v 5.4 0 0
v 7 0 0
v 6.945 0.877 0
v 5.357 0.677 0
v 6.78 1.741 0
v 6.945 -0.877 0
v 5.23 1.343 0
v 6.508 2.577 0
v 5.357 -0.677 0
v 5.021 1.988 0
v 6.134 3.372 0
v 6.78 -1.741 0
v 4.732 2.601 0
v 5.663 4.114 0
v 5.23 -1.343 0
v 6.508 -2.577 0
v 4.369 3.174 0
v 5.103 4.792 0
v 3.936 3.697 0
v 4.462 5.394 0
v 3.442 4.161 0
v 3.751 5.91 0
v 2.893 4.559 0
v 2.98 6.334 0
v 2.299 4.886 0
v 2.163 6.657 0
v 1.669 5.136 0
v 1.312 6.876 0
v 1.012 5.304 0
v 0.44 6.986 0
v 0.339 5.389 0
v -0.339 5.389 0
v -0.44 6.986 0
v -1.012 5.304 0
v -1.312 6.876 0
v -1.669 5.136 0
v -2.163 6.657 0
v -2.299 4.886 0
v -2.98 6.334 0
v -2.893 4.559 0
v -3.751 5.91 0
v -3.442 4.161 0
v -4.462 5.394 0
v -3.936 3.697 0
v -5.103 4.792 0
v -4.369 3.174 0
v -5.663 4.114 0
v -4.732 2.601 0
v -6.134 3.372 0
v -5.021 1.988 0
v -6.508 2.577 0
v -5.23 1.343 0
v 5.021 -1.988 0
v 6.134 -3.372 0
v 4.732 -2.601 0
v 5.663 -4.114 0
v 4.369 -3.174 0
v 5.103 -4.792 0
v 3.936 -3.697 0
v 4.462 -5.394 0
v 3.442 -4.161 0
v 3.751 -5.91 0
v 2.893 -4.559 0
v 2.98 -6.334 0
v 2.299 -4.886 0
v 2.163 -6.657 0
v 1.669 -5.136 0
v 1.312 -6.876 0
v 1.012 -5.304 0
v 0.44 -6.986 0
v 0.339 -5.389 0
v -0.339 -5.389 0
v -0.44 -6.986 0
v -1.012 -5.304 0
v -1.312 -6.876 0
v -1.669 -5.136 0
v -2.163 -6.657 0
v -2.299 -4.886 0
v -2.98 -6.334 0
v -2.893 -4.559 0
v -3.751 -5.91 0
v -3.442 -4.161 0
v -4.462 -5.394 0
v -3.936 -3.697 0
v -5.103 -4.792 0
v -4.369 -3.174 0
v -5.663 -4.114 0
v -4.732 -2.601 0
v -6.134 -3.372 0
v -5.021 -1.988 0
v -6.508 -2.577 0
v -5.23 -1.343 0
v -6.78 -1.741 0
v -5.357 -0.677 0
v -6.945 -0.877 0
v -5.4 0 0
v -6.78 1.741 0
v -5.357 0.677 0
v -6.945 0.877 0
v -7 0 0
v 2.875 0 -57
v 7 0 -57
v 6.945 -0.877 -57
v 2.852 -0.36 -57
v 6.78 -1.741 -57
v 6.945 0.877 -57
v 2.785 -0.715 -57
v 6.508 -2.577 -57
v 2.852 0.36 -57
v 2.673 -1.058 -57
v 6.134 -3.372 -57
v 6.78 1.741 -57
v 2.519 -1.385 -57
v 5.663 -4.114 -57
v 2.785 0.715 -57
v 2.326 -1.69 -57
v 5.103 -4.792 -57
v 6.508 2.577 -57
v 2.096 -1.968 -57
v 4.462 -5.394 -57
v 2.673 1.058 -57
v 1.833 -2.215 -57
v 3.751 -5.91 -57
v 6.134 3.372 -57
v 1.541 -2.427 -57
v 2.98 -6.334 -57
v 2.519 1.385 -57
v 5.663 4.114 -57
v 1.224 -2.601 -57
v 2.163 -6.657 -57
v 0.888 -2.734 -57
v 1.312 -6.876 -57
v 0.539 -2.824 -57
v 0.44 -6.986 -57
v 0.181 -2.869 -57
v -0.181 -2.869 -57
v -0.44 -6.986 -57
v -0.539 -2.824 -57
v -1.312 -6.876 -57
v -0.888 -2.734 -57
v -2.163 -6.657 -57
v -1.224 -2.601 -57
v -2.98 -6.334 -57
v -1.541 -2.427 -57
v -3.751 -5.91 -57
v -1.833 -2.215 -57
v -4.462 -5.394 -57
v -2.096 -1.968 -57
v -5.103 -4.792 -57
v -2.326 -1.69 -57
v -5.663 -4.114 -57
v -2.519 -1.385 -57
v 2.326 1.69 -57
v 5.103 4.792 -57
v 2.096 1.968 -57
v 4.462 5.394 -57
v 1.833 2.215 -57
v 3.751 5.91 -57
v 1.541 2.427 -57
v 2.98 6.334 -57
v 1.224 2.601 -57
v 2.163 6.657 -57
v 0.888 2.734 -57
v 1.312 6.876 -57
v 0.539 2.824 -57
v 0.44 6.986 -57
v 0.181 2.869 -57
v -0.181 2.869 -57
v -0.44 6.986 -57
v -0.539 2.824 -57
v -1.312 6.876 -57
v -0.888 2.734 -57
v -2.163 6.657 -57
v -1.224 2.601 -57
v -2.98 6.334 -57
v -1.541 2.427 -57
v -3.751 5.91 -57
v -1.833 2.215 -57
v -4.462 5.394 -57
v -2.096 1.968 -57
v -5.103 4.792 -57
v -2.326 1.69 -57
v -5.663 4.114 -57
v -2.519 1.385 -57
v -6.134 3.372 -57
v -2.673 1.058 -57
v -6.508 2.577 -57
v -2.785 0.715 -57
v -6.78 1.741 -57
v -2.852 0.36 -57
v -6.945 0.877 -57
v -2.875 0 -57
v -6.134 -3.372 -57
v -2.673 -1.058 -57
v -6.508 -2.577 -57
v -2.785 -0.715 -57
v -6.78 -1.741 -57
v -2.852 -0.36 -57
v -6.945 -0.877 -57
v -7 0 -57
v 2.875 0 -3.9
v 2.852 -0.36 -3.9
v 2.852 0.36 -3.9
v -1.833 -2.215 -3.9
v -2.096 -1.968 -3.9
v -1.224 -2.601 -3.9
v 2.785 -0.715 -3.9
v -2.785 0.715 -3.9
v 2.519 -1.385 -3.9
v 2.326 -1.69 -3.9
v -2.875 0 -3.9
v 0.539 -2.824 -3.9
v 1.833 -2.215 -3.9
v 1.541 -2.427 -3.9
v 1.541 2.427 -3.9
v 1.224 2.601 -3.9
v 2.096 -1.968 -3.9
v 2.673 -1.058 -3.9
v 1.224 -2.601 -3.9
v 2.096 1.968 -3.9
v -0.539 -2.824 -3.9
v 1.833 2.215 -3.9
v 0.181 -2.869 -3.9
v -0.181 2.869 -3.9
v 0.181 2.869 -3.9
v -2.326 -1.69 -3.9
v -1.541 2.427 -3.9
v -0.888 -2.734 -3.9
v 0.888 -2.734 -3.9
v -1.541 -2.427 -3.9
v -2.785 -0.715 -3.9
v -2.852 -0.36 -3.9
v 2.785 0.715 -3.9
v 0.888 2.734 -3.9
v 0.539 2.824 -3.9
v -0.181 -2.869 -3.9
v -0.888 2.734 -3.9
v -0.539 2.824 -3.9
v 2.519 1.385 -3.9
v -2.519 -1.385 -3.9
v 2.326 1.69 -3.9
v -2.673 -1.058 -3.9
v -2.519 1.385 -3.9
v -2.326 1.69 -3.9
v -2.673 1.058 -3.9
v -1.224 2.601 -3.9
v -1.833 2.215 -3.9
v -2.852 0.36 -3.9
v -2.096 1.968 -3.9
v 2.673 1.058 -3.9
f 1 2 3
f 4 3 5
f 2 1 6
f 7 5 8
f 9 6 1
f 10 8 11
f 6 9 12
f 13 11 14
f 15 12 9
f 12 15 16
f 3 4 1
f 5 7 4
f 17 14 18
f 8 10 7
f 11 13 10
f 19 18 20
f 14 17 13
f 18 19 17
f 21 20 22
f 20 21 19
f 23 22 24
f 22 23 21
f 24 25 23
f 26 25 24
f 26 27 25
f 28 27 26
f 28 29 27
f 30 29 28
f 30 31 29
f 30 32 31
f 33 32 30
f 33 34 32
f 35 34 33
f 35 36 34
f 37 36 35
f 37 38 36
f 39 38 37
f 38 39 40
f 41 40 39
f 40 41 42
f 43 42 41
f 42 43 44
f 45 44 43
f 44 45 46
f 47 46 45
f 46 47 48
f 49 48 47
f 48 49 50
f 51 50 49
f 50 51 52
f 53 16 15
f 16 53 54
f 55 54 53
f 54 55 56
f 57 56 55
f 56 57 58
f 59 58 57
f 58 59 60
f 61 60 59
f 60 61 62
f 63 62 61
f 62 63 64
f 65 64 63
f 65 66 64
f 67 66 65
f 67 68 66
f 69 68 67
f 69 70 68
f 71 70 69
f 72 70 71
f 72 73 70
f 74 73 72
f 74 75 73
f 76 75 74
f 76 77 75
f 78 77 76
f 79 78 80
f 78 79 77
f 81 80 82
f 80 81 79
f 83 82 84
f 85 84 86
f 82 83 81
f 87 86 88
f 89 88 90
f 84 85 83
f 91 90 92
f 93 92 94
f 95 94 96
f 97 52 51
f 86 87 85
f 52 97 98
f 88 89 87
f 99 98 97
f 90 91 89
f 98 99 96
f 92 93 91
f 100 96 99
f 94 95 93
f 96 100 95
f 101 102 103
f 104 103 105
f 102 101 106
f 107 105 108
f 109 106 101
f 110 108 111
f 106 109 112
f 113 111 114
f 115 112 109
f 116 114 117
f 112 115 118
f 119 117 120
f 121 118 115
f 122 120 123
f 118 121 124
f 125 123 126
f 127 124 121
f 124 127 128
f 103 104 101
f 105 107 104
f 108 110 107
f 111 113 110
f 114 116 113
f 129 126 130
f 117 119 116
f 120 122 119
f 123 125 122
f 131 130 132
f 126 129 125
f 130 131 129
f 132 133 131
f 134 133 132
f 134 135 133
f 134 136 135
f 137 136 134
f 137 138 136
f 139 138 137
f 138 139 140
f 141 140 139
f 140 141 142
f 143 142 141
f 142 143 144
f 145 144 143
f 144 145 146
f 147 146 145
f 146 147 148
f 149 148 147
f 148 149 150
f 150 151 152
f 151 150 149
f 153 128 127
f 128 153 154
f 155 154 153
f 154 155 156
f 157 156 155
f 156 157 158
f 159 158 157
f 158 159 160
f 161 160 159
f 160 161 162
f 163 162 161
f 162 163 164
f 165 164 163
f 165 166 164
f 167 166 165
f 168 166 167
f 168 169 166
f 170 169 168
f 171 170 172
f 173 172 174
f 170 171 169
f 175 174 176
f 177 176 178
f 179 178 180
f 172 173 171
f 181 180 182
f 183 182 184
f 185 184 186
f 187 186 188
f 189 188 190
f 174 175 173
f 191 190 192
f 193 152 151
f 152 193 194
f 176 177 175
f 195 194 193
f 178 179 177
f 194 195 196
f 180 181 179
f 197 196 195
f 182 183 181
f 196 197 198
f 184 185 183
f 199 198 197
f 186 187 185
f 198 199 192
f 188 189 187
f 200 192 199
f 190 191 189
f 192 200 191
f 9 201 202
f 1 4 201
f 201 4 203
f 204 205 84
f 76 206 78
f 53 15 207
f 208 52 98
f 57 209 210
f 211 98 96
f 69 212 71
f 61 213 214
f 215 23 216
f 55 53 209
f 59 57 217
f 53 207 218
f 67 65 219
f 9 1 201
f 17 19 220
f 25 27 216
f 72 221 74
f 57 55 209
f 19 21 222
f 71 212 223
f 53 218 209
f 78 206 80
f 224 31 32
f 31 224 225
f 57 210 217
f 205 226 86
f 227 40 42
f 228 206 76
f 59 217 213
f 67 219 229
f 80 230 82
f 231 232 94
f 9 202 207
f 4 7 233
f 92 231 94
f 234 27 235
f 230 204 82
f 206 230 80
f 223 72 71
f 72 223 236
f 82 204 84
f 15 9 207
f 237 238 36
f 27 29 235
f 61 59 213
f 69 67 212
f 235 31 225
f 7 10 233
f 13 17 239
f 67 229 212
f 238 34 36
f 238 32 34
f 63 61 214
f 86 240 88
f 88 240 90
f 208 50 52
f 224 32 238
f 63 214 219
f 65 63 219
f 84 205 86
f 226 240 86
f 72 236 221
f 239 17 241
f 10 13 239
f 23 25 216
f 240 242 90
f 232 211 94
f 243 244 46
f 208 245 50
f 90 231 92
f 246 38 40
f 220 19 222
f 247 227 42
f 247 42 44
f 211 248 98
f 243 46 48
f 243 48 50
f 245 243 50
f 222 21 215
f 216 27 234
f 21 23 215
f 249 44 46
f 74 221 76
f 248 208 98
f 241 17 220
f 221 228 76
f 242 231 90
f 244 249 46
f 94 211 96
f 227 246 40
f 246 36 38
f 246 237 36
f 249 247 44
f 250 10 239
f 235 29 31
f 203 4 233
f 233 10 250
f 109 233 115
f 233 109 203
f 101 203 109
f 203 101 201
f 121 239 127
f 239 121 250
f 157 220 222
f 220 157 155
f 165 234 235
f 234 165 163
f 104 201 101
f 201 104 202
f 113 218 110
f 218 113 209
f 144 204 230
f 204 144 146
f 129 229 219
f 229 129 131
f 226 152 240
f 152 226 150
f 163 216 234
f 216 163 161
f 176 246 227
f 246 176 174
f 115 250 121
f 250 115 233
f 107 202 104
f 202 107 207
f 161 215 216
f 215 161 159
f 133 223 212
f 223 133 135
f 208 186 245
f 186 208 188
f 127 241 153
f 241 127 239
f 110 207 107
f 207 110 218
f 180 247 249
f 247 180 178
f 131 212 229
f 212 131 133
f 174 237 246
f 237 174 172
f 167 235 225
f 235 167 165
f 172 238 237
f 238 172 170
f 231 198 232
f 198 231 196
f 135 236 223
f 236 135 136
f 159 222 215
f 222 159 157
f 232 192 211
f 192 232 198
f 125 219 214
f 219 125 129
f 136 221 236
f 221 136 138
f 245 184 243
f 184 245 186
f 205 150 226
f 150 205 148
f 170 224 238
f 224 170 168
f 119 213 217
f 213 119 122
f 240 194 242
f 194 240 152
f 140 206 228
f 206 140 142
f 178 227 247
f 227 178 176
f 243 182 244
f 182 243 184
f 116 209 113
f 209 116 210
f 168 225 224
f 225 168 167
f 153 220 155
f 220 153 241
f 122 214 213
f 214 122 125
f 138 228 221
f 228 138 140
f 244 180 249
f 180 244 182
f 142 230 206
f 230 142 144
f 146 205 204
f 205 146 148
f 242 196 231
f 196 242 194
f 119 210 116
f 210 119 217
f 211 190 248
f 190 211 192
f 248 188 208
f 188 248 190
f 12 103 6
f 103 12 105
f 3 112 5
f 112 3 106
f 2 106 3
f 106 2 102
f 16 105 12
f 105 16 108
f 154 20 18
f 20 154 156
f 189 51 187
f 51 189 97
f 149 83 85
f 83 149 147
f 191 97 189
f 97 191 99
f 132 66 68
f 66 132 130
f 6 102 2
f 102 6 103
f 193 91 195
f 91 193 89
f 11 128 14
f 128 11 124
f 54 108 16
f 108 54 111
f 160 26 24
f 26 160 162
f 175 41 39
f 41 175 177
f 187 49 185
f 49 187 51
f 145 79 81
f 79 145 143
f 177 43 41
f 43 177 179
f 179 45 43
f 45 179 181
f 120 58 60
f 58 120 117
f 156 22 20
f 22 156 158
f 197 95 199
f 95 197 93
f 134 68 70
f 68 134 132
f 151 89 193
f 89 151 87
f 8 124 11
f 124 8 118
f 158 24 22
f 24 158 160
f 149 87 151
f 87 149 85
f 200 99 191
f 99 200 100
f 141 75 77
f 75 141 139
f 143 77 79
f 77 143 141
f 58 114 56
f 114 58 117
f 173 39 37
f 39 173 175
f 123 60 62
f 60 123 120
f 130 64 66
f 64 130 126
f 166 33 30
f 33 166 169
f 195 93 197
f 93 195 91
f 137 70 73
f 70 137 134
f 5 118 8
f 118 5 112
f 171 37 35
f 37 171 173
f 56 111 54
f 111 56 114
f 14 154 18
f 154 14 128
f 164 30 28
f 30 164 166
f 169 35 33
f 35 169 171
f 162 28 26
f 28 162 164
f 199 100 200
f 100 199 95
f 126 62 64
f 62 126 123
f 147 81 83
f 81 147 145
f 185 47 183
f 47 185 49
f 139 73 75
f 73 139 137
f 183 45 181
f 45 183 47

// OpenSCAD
$fn = 50;


difference() {
	union() {
		translate(v = [0, 0, -57.0000000000]) {
			cylinder(h = 57, r = 7.0000000000);
		}
		cylinder(h = 0, r = 10.0000000000);
	}
	union() {
		translate(v = [0, 0, 0]) {
			rotate(a = [0, 0, 0]) {
				difference() {
					union() {
						#translate(v = [0, 0, -57.0000000000]) {
							cylinder(h = 57, r = 2.6000000000);
						}
						#translate(v = [0, 0, -3.9000000000]) {
							cylinder(h = 3.9000000000, r = 7.0000000000, r1 = 2.8750000000, r2 = 5.4000000000);
						}
						#translate(v = [0, 0, -57.0000000000]) {
							cylinder(h = 57, r = 2.8750000000);
						}
						#translate(v = [0, 0, -57.0000000000]) {
							cylinder(h = 57, r = 2.6000000000);
						}
					}
					union();
				}
			}
		}
	}
}
